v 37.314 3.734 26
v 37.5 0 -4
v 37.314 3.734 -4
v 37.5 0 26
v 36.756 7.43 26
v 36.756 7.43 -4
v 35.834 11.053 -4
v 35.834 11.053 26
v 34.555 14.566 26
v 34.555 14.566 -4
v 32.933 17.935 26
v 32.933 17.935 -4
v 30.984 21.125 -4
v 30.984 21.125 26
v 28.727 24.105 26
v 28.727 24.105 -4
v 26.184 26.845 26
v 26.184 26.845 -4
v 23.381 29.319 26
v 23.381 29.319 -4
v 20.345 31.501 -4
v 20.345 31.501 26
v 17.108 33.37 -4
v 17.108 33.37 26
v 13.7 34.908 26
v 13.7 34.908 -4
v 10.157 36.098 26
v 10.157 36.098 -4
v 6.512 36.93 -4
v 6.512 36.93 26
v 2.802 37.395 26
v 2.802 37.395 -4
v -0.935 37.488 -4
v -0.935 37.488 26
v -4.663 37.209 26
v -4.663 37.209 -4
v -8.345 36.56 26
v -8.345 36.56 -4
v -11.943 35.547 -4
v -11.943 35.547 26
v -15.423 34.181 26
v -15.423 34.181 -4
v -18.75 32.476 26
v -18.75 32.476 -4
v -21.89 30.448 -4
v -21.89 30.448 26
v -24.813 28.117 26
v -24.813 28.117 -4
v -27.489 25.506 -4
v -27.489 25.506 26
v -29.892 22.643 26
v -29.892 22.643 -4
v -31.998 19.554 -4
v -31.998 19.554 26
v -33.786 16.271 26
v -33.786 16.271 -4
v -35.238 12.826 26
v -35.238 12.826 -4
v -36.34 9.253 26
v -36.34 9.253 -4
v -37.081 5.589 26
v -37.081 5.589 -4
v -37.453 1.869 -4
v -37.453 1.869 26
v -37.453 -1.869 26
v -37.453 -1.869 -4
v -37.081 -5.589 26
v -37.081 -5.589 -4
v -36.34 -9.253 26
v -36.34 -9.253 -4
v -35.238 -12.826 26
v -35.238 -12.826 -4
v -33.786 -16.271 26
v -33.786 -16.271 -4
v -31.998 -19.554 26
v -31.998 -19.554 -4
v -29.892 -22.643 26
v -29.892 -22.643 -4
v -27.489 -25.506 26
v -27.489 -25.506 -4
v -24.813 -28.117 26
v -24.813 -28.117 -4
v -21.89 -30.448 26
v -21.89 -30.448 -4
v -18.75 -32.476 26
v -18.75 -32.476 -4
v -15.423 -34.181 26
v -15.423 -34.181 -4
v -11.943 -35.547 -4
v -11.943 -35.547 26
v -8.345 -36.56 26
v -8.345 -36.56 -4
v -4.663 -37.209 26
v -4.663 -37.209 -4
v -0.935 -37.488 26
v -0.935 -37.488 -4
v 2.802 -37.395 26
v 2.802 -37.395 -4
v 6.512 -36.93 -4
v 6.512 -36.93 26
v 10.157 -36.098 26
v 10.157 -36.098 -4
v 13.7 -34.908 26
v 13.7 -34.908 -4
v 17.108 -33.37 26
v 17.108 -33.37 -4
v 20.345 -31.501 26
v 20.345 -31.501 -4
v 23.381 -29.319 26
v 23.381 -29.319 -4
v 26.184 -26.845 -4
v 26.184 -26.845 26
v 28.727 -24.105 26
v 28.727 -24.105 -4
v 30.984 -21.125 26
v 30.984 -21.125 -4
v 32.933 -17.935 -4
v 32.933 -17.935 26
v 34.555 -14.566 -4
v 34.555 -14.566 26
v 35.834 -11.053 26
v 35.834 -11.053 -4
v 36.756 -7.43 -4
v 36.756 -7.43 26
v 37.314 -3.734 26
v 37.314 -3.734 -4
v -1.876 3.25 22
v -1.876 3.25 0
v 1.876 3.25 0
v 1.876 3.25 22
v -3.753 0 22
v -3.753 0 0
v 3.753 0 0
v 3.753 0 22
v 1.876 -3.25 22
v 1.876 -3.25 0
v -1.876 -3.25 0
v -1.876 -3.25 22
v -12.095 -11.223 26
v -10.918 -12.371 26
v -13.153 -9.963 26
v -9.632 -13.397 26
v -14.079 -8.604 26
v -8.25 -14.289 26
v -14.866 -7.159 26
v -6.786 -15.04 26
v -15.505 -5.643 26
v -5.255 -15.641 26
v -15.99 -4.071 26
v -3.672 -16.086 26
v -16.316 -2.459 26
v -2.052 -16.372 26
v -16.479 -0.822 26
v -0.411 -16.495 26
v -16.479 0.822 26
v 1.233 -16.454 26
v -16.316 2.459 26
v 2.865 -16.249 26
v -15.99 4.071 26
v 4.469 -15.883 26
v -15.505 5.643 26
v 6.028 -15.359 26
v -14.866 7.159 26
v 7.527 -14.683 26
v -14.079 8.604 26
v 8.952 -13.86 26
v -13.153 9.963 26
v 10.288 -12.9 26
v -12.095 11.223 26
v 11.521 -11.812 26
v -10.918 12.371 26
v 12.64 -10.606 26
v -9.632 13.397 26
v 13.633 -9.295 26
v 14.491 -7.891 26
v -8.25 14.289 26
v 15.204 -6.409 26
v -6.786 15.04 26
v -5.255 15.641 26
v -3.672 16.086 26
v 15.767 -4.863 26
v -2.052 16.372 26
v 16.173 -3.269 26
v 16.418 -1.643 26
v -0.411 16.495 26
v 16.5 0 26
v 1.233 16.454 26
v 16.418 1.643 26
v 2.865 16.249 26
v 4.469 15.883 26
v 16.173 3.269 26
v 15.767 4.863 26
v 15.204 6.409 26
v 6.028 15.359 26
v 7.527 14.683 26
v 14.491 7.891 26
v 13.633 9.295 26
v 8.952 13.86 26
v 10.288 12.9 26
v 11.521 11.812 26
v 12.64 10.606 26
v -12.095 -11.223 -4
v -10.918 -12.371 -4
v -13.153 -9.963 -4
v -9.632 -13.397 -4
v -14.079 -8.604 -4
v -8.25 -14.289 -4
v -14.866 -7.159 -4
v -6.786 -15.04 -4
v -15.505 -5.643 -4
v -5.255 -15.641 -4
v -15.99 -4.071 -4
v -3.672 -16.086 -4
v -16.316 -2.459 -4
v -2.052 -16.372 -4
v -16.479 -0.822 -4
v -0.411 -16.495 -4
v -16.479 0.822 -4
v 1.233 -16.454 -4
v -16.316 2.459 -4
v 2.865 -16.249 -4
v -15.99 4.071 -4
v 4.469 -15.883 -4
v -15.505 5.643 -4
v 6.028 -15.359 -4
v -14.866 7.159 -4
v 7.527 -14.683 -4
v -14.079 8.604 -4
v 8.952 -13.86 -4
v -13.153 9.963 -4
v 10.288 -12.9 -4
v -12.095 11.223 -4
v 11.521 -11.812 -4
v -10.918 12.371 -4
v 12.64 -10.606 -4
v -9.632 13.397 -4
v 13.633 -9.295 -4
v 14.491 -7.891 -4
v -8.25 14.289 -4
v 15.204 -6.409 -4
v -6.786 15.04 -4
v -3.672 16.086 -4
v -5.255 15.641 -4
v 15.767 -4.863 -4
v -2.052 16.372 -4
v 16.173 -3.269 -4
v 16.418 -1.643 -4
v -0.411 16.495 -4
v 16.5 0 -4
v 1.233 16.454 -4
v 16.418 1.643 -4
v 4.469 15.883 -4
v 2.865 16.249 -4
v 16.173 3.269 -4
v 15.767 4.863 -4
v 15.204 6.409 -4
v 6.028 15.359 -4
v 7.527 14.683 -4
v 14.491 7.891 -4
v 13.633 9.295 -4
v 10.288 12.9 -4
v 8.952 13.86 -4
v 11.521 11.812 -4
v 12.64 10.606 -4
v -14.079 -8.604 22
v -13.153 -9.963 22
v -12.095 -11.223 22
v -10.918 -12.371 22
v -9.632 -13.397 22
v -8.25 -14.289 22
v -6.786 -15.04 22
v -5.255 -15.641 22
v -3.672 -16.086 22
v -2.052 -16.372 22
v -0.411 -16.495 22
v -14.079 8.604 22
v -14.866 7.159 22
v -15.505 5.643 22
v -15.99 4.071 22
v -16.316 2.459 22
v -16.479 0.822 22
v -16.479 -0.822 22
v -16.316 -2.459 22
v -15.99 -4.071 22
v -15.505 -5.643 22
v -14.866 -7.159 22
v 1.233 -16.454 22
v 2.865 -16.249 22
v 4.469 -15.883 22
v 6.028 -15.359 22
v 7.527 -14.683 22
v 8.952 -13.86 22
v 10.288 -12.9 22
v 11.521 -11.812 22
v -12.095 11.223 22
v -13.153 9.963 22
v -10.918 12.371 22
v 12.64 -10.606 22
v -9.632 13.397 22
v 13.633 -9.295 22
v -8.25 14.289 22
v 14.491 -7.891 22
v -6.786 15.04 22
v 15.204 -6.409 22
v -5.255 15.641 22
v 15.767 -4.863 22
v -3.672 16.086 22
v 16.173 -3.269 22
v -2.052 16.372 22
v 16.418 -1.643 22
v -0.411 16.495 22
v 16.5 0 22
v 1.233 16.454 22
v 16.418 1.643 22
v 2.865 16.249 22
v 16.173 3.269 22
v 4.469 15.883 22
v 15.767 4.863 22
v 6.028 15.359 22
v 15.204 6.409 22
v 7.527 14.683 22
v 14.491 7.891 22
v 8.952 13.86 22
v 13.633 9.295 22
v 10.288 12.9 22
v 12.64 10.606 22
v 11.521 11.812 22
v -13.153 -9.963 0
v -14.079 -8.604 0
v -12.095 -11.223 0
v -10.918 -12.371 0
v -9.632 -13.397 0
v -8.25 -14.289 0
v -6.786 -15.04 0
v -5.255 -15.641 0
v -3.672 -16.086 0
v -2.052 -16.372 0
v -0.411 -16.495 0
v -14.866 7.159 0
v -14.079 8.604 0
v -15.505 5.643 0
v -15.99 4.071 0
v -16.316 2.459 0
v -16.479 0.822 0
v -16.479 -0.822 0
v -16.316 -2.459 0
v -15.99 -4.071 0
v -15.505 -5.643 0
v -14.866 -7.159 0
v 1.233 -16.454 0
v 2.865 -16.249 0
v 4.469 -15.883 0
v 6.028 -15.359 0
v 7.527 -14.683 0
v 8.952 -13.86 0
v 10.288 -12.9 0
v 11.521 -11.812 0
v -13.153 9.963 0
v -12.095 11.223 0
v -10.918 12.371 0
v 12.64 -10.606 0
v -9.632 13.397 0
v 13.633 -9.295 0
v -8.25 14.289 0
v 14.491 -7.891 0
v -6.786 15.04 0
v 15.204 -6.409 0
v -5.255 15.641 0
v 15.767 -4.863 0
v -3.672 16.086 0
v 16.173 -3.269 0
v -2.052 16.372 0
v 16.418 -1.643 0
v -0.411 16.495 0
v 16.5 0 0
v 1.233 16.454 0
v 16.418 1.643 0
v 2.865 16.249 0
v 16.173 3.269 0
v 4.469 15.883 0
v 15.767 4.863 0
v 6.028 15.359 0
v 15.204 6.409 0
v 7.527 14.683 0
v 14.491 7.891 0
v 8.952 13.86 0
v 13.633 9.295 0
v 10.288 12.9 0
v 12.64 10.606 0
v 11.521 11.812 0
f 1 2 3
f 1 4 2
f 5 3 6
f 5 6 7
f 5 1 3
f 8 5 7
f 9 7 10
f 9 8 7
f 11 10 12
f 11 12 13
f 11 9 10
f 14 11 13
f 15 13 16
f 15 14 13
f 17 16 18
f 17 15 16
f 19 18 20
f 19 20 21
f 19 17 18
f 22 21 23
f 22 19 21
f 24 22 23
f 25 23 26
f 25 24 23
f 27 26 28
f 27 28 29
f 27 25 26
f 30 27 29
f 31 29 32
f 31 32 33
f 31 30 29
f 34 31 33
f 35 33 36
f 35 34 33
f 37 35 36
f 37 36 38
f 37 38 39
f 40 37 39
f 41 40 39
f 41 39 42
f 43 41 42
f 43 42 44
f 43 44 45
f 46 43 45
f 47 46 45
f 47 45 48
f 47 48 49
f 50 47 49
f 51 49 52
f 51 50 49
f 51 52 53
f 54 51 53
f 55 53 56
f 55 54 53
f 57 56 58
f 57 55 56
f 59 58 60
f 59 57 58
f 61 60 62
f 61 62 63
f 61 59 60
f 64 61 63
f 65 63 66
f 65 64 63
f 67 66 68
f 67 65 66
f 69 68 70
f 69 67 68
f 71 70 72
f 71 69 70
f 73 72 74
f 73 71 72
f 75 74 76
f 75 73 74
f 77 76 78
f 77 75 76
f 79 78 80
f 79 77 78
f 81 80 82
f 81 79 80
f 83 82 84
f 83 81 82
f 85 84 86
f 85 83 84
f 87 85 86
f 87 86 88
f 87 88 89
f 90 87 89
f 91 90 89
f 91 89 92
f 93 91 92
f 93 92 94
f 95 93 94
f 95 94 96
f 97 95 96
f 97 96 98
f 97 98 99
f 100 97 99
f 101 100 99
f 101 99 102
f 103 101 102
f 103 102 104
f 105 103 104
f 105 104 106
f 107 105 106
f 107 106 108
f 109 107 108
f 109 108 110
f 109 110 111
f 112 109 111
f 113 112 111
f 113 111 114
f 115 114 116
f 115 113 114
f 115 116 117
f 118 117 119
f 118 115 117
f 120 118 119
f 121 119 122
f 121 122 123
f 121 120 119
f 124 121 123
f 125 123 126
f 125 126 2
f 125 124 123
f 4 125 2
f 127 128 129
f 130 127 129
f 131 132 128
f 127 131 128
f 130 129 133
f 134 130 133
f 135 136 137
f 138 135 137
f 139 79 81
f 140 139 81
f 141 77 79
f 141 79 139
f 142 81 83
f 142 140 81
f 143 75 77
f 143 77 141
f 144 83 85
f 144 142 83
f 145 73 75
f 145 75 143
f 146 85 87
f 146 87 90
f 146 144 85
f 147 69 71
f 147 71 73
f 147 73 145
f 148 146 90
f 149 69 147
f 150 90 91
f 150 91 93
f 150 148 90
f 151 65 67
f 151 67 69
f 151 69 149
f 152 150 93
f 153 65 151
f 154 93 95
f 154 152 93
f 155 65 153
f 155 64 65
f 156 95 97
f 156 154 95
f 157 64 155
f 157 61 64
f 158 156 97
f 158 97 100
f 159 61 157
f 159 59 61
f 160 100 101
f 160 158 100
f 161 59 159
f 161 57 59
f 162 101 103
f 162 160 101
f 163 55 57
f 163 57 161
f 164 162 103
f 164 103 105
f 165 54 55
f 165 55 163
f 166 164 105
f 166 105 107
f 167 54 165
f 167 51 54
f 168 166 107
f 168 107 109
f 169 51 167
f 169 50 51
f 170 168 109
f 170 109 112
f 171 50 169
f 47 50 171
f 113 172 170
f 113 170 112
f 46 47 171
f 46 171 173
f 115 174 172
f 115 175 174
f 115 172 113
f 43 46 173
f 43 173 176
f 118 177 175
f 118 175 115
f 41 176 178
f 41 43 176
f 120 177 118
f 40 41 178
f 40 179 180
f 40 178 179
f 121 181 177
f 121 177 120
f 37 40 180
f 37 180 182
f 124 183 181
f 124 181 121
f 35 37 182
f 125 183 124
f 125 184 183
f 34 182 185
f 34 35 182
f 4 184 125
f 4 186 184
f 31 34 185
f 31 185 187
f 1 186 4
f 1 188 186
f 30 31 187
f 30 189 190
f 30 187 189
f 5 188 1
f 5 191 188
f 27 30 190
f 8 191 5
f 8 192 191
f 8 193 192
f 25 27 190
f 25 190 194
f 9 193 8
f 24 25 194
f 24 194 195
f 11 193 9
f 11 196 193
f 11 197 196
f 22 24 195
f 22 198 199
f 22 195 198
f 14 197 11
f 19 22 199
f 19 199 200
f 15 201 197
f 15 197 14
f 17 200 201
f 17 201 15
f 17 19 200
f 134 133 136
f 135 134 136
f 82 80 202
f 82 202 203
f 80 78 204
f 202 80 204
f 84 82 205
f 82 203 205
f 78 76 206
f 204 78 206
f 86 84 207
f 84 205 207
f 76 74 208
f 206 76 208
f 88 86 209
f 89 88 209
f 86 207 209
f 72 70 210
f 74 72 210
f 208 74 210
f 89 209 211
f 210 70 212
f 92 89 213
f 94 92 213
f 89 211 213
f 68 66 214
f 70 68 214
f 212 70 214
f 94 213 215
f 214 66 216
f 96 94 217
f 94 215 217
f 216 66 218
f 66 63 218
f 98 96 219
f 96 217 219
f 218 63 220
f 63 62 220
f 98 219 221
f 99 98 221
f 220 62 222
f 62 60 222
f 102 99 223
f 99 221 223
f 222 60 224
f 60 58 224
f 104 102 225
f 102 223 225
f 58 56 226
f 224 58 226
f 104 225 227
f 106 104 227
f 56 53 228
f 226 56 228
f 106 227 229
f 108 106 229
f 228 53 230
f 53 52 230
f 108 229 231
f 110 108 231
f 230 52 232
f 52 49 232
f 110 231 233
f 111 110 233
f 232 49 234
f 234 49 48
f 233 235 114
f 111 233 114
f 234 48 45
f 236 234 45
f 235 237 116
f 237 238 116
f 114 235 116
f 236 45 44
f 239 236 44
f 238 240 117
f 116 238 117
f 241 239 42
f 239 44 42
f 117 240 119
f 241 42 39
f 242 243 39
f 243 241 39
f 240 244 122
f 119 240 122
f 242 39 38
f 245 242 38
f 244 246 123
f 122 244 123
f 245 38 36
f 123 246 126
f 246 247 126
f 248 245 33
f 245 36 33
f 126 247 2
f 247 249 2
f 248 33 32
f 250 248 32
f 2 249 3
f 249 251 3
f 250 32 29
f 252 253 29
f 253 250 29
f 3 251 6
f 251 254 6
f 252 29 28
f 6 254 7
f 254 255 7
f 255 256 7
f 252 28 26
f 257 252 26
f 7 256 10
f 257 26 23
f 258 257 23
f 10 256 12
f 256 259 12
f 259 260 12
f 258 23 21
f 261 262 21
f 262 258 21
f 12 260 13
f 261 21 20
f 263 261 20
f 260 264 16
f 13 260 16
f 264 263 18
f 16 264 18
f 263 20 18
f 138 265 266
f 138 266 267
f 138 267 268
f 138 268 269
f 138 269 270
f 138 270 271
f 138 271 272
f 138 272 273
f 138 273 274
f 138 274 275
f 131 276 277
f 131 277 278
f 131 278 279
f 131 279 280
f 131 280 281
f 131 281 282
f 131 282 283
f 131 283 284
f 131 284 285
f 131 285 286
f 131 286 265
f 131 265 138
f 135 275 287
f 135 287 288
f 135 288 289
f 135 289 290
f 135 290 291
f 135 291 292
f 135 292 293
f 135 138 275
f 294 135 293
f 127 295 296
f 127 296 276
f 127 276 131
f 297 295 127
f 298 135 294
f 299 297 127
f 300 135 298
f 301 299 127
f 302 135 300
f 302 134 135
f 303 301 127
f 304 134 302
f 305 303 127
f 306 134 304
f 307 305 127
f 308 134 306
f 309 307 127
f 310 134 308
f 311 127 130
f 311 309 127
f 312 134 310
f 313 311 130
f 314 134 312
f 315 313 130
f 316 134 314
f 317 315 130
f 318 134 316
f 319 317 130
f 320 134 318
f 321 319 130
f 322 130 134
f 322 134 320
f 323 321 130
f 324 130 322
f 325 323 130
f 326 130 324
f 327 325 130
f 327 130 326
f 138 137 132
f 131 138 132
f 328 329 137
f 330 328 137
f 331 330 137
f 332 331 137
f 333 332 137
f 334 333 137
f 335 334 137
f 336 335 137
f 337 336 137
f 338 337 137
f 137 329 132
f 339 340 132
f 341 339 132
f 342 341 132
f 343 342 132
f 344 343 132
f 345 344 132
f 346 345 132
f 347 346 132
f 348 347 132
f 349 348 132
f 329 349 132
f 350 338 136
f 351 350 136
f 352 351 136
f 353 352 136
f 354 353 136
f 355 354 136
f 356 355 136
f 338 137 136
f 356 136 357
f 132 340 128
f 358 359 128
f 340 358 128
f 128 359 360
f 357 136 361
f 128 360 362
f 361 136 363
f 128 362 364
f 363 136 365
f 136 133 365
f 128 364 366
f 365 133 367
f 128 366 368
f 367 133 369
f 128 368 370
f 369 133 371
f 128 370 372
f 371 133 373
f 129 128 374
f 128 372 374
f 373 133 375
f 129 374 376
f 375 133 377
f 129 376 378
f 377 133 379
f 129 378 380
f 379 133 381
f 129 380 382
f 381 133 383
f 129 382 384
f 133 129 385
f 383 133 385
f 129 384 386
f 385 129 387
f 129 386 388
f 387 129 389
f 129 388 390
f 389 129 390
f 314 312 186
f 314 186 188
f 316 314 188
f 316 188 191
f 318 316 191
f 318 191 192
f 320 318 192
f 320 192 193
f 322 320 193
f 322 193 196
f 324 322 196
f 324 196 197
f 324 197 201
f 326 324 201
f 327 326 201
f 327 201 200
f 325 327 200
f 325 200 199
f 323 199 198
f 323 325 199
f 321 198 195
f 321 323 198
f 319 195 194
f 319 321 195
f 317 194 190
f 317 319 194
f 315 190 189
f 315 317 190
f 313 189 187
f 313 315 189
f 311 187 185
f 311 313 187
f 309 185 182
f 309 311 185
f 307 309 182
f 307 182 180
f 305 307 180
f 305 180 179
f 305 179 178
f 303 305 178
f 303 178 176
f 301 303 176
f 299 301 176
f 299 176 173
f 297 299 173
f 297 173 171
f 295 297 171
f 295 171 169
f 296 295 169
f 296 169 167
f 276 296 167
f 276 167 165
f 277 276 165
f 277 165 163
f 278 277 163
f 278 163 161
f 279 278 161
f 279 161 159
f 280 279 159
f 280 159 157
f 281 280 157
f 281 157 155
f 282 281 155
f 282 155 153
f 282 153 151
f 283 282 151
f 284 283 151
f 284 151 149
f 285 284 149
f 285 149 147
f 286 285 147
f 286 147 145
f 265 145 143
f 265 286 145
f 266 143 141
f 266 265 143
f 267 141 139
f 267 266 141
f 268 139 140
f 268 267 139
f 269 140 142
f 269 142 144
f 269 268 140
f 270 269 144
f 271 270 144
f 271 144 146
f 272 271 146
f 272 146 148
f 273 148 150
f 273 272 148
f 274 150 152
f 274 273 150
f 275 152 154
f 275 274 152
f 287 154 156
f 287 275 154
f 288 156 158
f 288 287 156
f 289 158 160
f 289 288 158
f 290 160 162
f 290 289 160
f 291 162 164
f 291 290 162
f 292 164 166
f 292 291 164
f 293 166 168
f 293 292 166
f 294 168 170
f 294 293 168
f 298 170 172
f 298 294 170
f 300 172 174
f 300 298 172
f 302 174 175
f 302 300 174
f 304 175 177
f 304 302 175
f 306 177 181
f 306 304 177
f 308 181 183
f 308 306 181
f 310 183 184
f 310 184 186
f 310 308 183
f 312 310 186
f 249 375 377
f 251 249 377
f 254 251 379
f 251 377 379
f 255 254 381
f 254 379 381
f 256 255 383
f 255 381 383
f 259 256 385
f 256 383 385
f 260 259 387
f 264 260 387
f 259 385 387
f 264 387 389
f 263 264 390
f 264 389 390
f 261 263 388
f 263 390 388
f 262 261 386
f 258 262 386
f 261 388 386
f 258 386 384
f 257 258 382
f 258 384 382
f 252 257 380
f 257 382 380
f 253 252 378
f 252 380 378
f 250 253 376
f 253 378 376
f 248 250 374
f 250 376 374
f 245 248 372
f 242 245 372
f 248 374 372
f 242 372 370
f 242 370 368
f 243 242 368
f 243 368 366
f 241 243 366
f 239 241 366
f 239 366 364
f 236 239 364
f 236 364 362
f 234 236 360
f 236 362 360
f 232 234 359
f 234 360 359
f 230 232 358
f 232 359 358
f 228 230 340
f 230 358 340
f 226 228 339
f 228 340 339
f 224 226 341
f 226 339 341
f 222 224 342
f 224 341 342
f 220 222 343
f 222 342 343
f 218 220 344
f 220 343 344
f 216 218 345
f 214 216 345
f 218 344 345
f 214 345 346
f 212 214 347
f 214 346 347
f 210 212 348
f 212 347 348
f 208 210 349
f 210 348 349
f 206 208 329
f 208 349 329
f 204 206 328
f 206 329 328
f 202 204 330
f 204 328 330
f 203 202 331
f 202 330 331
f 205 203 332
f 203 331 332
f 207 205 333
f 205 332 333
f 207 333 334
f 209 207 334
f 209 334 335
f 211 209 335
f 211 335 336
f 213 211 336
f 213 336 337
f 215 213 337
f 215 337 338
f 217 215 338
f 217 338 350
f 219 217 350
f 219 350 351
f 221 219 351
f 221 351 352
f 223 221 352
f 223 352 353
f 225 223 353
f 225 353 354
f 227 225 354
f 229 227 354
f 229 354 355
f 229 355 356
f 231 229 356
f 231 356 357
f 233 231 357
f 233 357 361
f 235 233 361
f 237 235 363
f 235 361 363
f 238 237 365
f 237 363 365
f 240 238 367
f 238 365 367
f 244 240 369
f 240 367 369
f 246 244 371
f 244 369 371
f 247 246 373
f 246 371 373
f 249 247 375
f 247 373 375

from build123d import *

# Parameters (mm, degrees)
F0_R     = 16.5
F1_DEPTH = 22
F0_R_2   = 37.5
F2_DEPTH = 26
F3_DEPTH = 4


# Not quite as in the source:
# - a feature names something its author has since deleted; it is built from what else it names


with BuildPart() as f1:
    # F0 (on Top) → F1 (new body)
    with BuildSketch(Plane.XY):
        Circle(F0_R)
        Polygon((3.7527767497, 0), (1.8763883749, -3.25), (-1.8763883749, -3.25), (-3.7527767497, 0), (-1.8763883749, 3.25), (1.8763883749, 3.25), align=None, mode=Mode.SUBTRACT)
    extrude(amount=F1_DEPTH)

    # F0 (on Top) → F2 (join)
    with BuildSketch(Plane.XY):
        Circle(F0_R_2)
        Circle(F0_R, mode=Mode.SUBTRACT)
    extrude(amount=F2_DEPTH)

    # F0 (on Top) → F3 (join)
    with BuildSketch(Plane.XY):
        Circle(F0_R_2)
        Circle(F0_R, mode=Mode.SUBTRACT)
    extrude(amount=-F3_DEPTH)


solid = f1.part
